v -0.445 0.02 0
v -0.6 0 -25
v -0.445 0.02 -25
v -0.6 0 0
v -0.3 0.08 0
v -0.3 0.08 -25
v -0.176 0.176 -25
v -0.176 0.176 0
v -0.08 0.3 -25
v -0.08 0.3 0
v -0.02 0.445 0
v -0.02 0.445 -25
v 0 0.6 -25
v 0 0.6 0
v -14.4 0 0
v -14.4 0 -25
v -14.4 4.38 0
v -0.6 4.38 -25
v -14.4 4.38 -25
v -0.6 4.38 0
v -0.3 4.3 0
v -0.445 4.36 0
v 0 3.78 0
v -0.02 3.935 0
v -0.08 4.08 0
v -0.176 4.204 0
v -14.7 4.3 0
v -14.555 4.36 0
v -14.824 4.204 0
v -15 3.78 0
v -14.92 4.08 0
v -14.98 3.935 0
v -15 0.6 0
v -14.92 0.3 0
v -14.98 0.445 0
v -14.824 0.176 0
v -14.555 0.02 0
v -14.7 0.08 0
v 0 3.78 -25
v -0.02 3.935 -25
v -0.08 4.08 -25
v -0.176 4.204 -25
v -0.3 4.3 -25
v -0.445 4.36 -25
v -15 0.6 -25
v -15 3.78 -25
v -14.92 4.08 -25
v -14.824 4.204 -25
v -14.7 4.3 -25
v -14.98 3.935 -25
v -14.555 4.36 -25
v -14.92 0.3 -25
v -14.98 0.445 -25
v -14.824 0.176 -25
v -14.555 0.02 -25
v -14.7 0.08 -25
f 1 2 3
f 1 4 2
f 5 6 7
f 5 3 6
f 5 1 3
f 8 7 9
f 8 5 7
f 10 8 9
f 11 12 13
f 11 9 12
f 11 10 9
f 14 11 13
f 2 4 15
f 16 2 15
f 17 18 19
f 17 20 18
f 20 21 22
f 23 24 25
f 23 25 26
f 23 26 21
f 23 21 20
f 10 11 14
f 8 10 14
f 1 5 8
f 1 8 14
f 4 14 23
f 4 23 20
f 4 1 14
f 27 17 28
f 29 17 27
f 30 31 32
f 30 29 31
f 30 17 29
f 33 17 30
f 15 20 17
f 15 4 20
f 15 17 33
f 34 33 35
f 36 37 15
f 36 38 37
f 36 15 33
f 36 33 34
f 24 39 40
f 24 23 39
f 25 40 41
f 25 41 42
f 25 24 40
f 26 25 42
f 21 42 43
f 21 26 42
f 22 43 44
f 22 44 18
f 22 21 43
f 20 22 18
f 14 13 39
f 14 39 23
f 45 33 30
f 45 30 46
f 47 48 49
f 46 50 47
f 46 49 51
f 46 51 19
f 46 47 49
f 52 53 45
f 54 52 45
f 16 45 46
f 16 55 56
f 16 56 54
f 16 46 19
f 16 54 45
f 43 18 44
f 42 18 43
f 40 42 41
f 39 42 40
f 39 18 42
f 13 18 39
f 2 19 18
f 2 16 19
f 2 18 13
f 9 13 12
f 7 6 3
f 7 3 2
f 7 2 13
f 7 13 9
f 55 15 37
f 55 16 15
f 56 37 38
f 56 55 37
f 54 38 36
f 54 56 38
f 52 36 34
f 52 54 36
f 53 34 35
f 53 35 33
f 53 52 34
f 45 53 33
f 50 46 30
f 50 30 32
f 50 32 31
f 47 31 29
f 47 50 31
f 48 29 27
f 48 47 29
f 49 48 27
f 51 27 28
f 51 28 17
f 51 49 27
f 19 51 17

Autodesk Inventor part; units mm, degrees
ref_plane "YZ Plane" through (0, 0, 0) normal (1, 0, 0) x (0, 1, 0)
ref_plane "XZ Plane" through (0, 0, 0) normal (0, 1, 0) x (-1, 0, 0)
ref_plane "XY Plane" through (0, 0, 0) normal (0, 0, 1) x (1, 0, 0)
sketch "Szkic1" plane through (0, 0, 0) normal (0, 1, 0) x (-1, 0, 0)
  line L0 (0, 0) -> (15, 0)
  line L1 (15, 0) -> (15, -25)
  line L2 (15, -25) -> (0, -25)
  line L3 (0, -25) -> (0, 0)
  dimension "d0" = 15
  dimension "d1" = 25
extrude "Wyciągnięcie proste1" add sketch "Szkic1" along normal blind 4.38
fillet "Zaokrąglenie1" radius 0.6 2 edges at (-15, 4.38, -12.5) (0, 4.38, -12.5)
fillet "Zaokrąglenie2" radius 0.6 2 edges at (-15, 0, -12.5) (0, 0, -12.5)
properties part number "li-po 150mAh'"
